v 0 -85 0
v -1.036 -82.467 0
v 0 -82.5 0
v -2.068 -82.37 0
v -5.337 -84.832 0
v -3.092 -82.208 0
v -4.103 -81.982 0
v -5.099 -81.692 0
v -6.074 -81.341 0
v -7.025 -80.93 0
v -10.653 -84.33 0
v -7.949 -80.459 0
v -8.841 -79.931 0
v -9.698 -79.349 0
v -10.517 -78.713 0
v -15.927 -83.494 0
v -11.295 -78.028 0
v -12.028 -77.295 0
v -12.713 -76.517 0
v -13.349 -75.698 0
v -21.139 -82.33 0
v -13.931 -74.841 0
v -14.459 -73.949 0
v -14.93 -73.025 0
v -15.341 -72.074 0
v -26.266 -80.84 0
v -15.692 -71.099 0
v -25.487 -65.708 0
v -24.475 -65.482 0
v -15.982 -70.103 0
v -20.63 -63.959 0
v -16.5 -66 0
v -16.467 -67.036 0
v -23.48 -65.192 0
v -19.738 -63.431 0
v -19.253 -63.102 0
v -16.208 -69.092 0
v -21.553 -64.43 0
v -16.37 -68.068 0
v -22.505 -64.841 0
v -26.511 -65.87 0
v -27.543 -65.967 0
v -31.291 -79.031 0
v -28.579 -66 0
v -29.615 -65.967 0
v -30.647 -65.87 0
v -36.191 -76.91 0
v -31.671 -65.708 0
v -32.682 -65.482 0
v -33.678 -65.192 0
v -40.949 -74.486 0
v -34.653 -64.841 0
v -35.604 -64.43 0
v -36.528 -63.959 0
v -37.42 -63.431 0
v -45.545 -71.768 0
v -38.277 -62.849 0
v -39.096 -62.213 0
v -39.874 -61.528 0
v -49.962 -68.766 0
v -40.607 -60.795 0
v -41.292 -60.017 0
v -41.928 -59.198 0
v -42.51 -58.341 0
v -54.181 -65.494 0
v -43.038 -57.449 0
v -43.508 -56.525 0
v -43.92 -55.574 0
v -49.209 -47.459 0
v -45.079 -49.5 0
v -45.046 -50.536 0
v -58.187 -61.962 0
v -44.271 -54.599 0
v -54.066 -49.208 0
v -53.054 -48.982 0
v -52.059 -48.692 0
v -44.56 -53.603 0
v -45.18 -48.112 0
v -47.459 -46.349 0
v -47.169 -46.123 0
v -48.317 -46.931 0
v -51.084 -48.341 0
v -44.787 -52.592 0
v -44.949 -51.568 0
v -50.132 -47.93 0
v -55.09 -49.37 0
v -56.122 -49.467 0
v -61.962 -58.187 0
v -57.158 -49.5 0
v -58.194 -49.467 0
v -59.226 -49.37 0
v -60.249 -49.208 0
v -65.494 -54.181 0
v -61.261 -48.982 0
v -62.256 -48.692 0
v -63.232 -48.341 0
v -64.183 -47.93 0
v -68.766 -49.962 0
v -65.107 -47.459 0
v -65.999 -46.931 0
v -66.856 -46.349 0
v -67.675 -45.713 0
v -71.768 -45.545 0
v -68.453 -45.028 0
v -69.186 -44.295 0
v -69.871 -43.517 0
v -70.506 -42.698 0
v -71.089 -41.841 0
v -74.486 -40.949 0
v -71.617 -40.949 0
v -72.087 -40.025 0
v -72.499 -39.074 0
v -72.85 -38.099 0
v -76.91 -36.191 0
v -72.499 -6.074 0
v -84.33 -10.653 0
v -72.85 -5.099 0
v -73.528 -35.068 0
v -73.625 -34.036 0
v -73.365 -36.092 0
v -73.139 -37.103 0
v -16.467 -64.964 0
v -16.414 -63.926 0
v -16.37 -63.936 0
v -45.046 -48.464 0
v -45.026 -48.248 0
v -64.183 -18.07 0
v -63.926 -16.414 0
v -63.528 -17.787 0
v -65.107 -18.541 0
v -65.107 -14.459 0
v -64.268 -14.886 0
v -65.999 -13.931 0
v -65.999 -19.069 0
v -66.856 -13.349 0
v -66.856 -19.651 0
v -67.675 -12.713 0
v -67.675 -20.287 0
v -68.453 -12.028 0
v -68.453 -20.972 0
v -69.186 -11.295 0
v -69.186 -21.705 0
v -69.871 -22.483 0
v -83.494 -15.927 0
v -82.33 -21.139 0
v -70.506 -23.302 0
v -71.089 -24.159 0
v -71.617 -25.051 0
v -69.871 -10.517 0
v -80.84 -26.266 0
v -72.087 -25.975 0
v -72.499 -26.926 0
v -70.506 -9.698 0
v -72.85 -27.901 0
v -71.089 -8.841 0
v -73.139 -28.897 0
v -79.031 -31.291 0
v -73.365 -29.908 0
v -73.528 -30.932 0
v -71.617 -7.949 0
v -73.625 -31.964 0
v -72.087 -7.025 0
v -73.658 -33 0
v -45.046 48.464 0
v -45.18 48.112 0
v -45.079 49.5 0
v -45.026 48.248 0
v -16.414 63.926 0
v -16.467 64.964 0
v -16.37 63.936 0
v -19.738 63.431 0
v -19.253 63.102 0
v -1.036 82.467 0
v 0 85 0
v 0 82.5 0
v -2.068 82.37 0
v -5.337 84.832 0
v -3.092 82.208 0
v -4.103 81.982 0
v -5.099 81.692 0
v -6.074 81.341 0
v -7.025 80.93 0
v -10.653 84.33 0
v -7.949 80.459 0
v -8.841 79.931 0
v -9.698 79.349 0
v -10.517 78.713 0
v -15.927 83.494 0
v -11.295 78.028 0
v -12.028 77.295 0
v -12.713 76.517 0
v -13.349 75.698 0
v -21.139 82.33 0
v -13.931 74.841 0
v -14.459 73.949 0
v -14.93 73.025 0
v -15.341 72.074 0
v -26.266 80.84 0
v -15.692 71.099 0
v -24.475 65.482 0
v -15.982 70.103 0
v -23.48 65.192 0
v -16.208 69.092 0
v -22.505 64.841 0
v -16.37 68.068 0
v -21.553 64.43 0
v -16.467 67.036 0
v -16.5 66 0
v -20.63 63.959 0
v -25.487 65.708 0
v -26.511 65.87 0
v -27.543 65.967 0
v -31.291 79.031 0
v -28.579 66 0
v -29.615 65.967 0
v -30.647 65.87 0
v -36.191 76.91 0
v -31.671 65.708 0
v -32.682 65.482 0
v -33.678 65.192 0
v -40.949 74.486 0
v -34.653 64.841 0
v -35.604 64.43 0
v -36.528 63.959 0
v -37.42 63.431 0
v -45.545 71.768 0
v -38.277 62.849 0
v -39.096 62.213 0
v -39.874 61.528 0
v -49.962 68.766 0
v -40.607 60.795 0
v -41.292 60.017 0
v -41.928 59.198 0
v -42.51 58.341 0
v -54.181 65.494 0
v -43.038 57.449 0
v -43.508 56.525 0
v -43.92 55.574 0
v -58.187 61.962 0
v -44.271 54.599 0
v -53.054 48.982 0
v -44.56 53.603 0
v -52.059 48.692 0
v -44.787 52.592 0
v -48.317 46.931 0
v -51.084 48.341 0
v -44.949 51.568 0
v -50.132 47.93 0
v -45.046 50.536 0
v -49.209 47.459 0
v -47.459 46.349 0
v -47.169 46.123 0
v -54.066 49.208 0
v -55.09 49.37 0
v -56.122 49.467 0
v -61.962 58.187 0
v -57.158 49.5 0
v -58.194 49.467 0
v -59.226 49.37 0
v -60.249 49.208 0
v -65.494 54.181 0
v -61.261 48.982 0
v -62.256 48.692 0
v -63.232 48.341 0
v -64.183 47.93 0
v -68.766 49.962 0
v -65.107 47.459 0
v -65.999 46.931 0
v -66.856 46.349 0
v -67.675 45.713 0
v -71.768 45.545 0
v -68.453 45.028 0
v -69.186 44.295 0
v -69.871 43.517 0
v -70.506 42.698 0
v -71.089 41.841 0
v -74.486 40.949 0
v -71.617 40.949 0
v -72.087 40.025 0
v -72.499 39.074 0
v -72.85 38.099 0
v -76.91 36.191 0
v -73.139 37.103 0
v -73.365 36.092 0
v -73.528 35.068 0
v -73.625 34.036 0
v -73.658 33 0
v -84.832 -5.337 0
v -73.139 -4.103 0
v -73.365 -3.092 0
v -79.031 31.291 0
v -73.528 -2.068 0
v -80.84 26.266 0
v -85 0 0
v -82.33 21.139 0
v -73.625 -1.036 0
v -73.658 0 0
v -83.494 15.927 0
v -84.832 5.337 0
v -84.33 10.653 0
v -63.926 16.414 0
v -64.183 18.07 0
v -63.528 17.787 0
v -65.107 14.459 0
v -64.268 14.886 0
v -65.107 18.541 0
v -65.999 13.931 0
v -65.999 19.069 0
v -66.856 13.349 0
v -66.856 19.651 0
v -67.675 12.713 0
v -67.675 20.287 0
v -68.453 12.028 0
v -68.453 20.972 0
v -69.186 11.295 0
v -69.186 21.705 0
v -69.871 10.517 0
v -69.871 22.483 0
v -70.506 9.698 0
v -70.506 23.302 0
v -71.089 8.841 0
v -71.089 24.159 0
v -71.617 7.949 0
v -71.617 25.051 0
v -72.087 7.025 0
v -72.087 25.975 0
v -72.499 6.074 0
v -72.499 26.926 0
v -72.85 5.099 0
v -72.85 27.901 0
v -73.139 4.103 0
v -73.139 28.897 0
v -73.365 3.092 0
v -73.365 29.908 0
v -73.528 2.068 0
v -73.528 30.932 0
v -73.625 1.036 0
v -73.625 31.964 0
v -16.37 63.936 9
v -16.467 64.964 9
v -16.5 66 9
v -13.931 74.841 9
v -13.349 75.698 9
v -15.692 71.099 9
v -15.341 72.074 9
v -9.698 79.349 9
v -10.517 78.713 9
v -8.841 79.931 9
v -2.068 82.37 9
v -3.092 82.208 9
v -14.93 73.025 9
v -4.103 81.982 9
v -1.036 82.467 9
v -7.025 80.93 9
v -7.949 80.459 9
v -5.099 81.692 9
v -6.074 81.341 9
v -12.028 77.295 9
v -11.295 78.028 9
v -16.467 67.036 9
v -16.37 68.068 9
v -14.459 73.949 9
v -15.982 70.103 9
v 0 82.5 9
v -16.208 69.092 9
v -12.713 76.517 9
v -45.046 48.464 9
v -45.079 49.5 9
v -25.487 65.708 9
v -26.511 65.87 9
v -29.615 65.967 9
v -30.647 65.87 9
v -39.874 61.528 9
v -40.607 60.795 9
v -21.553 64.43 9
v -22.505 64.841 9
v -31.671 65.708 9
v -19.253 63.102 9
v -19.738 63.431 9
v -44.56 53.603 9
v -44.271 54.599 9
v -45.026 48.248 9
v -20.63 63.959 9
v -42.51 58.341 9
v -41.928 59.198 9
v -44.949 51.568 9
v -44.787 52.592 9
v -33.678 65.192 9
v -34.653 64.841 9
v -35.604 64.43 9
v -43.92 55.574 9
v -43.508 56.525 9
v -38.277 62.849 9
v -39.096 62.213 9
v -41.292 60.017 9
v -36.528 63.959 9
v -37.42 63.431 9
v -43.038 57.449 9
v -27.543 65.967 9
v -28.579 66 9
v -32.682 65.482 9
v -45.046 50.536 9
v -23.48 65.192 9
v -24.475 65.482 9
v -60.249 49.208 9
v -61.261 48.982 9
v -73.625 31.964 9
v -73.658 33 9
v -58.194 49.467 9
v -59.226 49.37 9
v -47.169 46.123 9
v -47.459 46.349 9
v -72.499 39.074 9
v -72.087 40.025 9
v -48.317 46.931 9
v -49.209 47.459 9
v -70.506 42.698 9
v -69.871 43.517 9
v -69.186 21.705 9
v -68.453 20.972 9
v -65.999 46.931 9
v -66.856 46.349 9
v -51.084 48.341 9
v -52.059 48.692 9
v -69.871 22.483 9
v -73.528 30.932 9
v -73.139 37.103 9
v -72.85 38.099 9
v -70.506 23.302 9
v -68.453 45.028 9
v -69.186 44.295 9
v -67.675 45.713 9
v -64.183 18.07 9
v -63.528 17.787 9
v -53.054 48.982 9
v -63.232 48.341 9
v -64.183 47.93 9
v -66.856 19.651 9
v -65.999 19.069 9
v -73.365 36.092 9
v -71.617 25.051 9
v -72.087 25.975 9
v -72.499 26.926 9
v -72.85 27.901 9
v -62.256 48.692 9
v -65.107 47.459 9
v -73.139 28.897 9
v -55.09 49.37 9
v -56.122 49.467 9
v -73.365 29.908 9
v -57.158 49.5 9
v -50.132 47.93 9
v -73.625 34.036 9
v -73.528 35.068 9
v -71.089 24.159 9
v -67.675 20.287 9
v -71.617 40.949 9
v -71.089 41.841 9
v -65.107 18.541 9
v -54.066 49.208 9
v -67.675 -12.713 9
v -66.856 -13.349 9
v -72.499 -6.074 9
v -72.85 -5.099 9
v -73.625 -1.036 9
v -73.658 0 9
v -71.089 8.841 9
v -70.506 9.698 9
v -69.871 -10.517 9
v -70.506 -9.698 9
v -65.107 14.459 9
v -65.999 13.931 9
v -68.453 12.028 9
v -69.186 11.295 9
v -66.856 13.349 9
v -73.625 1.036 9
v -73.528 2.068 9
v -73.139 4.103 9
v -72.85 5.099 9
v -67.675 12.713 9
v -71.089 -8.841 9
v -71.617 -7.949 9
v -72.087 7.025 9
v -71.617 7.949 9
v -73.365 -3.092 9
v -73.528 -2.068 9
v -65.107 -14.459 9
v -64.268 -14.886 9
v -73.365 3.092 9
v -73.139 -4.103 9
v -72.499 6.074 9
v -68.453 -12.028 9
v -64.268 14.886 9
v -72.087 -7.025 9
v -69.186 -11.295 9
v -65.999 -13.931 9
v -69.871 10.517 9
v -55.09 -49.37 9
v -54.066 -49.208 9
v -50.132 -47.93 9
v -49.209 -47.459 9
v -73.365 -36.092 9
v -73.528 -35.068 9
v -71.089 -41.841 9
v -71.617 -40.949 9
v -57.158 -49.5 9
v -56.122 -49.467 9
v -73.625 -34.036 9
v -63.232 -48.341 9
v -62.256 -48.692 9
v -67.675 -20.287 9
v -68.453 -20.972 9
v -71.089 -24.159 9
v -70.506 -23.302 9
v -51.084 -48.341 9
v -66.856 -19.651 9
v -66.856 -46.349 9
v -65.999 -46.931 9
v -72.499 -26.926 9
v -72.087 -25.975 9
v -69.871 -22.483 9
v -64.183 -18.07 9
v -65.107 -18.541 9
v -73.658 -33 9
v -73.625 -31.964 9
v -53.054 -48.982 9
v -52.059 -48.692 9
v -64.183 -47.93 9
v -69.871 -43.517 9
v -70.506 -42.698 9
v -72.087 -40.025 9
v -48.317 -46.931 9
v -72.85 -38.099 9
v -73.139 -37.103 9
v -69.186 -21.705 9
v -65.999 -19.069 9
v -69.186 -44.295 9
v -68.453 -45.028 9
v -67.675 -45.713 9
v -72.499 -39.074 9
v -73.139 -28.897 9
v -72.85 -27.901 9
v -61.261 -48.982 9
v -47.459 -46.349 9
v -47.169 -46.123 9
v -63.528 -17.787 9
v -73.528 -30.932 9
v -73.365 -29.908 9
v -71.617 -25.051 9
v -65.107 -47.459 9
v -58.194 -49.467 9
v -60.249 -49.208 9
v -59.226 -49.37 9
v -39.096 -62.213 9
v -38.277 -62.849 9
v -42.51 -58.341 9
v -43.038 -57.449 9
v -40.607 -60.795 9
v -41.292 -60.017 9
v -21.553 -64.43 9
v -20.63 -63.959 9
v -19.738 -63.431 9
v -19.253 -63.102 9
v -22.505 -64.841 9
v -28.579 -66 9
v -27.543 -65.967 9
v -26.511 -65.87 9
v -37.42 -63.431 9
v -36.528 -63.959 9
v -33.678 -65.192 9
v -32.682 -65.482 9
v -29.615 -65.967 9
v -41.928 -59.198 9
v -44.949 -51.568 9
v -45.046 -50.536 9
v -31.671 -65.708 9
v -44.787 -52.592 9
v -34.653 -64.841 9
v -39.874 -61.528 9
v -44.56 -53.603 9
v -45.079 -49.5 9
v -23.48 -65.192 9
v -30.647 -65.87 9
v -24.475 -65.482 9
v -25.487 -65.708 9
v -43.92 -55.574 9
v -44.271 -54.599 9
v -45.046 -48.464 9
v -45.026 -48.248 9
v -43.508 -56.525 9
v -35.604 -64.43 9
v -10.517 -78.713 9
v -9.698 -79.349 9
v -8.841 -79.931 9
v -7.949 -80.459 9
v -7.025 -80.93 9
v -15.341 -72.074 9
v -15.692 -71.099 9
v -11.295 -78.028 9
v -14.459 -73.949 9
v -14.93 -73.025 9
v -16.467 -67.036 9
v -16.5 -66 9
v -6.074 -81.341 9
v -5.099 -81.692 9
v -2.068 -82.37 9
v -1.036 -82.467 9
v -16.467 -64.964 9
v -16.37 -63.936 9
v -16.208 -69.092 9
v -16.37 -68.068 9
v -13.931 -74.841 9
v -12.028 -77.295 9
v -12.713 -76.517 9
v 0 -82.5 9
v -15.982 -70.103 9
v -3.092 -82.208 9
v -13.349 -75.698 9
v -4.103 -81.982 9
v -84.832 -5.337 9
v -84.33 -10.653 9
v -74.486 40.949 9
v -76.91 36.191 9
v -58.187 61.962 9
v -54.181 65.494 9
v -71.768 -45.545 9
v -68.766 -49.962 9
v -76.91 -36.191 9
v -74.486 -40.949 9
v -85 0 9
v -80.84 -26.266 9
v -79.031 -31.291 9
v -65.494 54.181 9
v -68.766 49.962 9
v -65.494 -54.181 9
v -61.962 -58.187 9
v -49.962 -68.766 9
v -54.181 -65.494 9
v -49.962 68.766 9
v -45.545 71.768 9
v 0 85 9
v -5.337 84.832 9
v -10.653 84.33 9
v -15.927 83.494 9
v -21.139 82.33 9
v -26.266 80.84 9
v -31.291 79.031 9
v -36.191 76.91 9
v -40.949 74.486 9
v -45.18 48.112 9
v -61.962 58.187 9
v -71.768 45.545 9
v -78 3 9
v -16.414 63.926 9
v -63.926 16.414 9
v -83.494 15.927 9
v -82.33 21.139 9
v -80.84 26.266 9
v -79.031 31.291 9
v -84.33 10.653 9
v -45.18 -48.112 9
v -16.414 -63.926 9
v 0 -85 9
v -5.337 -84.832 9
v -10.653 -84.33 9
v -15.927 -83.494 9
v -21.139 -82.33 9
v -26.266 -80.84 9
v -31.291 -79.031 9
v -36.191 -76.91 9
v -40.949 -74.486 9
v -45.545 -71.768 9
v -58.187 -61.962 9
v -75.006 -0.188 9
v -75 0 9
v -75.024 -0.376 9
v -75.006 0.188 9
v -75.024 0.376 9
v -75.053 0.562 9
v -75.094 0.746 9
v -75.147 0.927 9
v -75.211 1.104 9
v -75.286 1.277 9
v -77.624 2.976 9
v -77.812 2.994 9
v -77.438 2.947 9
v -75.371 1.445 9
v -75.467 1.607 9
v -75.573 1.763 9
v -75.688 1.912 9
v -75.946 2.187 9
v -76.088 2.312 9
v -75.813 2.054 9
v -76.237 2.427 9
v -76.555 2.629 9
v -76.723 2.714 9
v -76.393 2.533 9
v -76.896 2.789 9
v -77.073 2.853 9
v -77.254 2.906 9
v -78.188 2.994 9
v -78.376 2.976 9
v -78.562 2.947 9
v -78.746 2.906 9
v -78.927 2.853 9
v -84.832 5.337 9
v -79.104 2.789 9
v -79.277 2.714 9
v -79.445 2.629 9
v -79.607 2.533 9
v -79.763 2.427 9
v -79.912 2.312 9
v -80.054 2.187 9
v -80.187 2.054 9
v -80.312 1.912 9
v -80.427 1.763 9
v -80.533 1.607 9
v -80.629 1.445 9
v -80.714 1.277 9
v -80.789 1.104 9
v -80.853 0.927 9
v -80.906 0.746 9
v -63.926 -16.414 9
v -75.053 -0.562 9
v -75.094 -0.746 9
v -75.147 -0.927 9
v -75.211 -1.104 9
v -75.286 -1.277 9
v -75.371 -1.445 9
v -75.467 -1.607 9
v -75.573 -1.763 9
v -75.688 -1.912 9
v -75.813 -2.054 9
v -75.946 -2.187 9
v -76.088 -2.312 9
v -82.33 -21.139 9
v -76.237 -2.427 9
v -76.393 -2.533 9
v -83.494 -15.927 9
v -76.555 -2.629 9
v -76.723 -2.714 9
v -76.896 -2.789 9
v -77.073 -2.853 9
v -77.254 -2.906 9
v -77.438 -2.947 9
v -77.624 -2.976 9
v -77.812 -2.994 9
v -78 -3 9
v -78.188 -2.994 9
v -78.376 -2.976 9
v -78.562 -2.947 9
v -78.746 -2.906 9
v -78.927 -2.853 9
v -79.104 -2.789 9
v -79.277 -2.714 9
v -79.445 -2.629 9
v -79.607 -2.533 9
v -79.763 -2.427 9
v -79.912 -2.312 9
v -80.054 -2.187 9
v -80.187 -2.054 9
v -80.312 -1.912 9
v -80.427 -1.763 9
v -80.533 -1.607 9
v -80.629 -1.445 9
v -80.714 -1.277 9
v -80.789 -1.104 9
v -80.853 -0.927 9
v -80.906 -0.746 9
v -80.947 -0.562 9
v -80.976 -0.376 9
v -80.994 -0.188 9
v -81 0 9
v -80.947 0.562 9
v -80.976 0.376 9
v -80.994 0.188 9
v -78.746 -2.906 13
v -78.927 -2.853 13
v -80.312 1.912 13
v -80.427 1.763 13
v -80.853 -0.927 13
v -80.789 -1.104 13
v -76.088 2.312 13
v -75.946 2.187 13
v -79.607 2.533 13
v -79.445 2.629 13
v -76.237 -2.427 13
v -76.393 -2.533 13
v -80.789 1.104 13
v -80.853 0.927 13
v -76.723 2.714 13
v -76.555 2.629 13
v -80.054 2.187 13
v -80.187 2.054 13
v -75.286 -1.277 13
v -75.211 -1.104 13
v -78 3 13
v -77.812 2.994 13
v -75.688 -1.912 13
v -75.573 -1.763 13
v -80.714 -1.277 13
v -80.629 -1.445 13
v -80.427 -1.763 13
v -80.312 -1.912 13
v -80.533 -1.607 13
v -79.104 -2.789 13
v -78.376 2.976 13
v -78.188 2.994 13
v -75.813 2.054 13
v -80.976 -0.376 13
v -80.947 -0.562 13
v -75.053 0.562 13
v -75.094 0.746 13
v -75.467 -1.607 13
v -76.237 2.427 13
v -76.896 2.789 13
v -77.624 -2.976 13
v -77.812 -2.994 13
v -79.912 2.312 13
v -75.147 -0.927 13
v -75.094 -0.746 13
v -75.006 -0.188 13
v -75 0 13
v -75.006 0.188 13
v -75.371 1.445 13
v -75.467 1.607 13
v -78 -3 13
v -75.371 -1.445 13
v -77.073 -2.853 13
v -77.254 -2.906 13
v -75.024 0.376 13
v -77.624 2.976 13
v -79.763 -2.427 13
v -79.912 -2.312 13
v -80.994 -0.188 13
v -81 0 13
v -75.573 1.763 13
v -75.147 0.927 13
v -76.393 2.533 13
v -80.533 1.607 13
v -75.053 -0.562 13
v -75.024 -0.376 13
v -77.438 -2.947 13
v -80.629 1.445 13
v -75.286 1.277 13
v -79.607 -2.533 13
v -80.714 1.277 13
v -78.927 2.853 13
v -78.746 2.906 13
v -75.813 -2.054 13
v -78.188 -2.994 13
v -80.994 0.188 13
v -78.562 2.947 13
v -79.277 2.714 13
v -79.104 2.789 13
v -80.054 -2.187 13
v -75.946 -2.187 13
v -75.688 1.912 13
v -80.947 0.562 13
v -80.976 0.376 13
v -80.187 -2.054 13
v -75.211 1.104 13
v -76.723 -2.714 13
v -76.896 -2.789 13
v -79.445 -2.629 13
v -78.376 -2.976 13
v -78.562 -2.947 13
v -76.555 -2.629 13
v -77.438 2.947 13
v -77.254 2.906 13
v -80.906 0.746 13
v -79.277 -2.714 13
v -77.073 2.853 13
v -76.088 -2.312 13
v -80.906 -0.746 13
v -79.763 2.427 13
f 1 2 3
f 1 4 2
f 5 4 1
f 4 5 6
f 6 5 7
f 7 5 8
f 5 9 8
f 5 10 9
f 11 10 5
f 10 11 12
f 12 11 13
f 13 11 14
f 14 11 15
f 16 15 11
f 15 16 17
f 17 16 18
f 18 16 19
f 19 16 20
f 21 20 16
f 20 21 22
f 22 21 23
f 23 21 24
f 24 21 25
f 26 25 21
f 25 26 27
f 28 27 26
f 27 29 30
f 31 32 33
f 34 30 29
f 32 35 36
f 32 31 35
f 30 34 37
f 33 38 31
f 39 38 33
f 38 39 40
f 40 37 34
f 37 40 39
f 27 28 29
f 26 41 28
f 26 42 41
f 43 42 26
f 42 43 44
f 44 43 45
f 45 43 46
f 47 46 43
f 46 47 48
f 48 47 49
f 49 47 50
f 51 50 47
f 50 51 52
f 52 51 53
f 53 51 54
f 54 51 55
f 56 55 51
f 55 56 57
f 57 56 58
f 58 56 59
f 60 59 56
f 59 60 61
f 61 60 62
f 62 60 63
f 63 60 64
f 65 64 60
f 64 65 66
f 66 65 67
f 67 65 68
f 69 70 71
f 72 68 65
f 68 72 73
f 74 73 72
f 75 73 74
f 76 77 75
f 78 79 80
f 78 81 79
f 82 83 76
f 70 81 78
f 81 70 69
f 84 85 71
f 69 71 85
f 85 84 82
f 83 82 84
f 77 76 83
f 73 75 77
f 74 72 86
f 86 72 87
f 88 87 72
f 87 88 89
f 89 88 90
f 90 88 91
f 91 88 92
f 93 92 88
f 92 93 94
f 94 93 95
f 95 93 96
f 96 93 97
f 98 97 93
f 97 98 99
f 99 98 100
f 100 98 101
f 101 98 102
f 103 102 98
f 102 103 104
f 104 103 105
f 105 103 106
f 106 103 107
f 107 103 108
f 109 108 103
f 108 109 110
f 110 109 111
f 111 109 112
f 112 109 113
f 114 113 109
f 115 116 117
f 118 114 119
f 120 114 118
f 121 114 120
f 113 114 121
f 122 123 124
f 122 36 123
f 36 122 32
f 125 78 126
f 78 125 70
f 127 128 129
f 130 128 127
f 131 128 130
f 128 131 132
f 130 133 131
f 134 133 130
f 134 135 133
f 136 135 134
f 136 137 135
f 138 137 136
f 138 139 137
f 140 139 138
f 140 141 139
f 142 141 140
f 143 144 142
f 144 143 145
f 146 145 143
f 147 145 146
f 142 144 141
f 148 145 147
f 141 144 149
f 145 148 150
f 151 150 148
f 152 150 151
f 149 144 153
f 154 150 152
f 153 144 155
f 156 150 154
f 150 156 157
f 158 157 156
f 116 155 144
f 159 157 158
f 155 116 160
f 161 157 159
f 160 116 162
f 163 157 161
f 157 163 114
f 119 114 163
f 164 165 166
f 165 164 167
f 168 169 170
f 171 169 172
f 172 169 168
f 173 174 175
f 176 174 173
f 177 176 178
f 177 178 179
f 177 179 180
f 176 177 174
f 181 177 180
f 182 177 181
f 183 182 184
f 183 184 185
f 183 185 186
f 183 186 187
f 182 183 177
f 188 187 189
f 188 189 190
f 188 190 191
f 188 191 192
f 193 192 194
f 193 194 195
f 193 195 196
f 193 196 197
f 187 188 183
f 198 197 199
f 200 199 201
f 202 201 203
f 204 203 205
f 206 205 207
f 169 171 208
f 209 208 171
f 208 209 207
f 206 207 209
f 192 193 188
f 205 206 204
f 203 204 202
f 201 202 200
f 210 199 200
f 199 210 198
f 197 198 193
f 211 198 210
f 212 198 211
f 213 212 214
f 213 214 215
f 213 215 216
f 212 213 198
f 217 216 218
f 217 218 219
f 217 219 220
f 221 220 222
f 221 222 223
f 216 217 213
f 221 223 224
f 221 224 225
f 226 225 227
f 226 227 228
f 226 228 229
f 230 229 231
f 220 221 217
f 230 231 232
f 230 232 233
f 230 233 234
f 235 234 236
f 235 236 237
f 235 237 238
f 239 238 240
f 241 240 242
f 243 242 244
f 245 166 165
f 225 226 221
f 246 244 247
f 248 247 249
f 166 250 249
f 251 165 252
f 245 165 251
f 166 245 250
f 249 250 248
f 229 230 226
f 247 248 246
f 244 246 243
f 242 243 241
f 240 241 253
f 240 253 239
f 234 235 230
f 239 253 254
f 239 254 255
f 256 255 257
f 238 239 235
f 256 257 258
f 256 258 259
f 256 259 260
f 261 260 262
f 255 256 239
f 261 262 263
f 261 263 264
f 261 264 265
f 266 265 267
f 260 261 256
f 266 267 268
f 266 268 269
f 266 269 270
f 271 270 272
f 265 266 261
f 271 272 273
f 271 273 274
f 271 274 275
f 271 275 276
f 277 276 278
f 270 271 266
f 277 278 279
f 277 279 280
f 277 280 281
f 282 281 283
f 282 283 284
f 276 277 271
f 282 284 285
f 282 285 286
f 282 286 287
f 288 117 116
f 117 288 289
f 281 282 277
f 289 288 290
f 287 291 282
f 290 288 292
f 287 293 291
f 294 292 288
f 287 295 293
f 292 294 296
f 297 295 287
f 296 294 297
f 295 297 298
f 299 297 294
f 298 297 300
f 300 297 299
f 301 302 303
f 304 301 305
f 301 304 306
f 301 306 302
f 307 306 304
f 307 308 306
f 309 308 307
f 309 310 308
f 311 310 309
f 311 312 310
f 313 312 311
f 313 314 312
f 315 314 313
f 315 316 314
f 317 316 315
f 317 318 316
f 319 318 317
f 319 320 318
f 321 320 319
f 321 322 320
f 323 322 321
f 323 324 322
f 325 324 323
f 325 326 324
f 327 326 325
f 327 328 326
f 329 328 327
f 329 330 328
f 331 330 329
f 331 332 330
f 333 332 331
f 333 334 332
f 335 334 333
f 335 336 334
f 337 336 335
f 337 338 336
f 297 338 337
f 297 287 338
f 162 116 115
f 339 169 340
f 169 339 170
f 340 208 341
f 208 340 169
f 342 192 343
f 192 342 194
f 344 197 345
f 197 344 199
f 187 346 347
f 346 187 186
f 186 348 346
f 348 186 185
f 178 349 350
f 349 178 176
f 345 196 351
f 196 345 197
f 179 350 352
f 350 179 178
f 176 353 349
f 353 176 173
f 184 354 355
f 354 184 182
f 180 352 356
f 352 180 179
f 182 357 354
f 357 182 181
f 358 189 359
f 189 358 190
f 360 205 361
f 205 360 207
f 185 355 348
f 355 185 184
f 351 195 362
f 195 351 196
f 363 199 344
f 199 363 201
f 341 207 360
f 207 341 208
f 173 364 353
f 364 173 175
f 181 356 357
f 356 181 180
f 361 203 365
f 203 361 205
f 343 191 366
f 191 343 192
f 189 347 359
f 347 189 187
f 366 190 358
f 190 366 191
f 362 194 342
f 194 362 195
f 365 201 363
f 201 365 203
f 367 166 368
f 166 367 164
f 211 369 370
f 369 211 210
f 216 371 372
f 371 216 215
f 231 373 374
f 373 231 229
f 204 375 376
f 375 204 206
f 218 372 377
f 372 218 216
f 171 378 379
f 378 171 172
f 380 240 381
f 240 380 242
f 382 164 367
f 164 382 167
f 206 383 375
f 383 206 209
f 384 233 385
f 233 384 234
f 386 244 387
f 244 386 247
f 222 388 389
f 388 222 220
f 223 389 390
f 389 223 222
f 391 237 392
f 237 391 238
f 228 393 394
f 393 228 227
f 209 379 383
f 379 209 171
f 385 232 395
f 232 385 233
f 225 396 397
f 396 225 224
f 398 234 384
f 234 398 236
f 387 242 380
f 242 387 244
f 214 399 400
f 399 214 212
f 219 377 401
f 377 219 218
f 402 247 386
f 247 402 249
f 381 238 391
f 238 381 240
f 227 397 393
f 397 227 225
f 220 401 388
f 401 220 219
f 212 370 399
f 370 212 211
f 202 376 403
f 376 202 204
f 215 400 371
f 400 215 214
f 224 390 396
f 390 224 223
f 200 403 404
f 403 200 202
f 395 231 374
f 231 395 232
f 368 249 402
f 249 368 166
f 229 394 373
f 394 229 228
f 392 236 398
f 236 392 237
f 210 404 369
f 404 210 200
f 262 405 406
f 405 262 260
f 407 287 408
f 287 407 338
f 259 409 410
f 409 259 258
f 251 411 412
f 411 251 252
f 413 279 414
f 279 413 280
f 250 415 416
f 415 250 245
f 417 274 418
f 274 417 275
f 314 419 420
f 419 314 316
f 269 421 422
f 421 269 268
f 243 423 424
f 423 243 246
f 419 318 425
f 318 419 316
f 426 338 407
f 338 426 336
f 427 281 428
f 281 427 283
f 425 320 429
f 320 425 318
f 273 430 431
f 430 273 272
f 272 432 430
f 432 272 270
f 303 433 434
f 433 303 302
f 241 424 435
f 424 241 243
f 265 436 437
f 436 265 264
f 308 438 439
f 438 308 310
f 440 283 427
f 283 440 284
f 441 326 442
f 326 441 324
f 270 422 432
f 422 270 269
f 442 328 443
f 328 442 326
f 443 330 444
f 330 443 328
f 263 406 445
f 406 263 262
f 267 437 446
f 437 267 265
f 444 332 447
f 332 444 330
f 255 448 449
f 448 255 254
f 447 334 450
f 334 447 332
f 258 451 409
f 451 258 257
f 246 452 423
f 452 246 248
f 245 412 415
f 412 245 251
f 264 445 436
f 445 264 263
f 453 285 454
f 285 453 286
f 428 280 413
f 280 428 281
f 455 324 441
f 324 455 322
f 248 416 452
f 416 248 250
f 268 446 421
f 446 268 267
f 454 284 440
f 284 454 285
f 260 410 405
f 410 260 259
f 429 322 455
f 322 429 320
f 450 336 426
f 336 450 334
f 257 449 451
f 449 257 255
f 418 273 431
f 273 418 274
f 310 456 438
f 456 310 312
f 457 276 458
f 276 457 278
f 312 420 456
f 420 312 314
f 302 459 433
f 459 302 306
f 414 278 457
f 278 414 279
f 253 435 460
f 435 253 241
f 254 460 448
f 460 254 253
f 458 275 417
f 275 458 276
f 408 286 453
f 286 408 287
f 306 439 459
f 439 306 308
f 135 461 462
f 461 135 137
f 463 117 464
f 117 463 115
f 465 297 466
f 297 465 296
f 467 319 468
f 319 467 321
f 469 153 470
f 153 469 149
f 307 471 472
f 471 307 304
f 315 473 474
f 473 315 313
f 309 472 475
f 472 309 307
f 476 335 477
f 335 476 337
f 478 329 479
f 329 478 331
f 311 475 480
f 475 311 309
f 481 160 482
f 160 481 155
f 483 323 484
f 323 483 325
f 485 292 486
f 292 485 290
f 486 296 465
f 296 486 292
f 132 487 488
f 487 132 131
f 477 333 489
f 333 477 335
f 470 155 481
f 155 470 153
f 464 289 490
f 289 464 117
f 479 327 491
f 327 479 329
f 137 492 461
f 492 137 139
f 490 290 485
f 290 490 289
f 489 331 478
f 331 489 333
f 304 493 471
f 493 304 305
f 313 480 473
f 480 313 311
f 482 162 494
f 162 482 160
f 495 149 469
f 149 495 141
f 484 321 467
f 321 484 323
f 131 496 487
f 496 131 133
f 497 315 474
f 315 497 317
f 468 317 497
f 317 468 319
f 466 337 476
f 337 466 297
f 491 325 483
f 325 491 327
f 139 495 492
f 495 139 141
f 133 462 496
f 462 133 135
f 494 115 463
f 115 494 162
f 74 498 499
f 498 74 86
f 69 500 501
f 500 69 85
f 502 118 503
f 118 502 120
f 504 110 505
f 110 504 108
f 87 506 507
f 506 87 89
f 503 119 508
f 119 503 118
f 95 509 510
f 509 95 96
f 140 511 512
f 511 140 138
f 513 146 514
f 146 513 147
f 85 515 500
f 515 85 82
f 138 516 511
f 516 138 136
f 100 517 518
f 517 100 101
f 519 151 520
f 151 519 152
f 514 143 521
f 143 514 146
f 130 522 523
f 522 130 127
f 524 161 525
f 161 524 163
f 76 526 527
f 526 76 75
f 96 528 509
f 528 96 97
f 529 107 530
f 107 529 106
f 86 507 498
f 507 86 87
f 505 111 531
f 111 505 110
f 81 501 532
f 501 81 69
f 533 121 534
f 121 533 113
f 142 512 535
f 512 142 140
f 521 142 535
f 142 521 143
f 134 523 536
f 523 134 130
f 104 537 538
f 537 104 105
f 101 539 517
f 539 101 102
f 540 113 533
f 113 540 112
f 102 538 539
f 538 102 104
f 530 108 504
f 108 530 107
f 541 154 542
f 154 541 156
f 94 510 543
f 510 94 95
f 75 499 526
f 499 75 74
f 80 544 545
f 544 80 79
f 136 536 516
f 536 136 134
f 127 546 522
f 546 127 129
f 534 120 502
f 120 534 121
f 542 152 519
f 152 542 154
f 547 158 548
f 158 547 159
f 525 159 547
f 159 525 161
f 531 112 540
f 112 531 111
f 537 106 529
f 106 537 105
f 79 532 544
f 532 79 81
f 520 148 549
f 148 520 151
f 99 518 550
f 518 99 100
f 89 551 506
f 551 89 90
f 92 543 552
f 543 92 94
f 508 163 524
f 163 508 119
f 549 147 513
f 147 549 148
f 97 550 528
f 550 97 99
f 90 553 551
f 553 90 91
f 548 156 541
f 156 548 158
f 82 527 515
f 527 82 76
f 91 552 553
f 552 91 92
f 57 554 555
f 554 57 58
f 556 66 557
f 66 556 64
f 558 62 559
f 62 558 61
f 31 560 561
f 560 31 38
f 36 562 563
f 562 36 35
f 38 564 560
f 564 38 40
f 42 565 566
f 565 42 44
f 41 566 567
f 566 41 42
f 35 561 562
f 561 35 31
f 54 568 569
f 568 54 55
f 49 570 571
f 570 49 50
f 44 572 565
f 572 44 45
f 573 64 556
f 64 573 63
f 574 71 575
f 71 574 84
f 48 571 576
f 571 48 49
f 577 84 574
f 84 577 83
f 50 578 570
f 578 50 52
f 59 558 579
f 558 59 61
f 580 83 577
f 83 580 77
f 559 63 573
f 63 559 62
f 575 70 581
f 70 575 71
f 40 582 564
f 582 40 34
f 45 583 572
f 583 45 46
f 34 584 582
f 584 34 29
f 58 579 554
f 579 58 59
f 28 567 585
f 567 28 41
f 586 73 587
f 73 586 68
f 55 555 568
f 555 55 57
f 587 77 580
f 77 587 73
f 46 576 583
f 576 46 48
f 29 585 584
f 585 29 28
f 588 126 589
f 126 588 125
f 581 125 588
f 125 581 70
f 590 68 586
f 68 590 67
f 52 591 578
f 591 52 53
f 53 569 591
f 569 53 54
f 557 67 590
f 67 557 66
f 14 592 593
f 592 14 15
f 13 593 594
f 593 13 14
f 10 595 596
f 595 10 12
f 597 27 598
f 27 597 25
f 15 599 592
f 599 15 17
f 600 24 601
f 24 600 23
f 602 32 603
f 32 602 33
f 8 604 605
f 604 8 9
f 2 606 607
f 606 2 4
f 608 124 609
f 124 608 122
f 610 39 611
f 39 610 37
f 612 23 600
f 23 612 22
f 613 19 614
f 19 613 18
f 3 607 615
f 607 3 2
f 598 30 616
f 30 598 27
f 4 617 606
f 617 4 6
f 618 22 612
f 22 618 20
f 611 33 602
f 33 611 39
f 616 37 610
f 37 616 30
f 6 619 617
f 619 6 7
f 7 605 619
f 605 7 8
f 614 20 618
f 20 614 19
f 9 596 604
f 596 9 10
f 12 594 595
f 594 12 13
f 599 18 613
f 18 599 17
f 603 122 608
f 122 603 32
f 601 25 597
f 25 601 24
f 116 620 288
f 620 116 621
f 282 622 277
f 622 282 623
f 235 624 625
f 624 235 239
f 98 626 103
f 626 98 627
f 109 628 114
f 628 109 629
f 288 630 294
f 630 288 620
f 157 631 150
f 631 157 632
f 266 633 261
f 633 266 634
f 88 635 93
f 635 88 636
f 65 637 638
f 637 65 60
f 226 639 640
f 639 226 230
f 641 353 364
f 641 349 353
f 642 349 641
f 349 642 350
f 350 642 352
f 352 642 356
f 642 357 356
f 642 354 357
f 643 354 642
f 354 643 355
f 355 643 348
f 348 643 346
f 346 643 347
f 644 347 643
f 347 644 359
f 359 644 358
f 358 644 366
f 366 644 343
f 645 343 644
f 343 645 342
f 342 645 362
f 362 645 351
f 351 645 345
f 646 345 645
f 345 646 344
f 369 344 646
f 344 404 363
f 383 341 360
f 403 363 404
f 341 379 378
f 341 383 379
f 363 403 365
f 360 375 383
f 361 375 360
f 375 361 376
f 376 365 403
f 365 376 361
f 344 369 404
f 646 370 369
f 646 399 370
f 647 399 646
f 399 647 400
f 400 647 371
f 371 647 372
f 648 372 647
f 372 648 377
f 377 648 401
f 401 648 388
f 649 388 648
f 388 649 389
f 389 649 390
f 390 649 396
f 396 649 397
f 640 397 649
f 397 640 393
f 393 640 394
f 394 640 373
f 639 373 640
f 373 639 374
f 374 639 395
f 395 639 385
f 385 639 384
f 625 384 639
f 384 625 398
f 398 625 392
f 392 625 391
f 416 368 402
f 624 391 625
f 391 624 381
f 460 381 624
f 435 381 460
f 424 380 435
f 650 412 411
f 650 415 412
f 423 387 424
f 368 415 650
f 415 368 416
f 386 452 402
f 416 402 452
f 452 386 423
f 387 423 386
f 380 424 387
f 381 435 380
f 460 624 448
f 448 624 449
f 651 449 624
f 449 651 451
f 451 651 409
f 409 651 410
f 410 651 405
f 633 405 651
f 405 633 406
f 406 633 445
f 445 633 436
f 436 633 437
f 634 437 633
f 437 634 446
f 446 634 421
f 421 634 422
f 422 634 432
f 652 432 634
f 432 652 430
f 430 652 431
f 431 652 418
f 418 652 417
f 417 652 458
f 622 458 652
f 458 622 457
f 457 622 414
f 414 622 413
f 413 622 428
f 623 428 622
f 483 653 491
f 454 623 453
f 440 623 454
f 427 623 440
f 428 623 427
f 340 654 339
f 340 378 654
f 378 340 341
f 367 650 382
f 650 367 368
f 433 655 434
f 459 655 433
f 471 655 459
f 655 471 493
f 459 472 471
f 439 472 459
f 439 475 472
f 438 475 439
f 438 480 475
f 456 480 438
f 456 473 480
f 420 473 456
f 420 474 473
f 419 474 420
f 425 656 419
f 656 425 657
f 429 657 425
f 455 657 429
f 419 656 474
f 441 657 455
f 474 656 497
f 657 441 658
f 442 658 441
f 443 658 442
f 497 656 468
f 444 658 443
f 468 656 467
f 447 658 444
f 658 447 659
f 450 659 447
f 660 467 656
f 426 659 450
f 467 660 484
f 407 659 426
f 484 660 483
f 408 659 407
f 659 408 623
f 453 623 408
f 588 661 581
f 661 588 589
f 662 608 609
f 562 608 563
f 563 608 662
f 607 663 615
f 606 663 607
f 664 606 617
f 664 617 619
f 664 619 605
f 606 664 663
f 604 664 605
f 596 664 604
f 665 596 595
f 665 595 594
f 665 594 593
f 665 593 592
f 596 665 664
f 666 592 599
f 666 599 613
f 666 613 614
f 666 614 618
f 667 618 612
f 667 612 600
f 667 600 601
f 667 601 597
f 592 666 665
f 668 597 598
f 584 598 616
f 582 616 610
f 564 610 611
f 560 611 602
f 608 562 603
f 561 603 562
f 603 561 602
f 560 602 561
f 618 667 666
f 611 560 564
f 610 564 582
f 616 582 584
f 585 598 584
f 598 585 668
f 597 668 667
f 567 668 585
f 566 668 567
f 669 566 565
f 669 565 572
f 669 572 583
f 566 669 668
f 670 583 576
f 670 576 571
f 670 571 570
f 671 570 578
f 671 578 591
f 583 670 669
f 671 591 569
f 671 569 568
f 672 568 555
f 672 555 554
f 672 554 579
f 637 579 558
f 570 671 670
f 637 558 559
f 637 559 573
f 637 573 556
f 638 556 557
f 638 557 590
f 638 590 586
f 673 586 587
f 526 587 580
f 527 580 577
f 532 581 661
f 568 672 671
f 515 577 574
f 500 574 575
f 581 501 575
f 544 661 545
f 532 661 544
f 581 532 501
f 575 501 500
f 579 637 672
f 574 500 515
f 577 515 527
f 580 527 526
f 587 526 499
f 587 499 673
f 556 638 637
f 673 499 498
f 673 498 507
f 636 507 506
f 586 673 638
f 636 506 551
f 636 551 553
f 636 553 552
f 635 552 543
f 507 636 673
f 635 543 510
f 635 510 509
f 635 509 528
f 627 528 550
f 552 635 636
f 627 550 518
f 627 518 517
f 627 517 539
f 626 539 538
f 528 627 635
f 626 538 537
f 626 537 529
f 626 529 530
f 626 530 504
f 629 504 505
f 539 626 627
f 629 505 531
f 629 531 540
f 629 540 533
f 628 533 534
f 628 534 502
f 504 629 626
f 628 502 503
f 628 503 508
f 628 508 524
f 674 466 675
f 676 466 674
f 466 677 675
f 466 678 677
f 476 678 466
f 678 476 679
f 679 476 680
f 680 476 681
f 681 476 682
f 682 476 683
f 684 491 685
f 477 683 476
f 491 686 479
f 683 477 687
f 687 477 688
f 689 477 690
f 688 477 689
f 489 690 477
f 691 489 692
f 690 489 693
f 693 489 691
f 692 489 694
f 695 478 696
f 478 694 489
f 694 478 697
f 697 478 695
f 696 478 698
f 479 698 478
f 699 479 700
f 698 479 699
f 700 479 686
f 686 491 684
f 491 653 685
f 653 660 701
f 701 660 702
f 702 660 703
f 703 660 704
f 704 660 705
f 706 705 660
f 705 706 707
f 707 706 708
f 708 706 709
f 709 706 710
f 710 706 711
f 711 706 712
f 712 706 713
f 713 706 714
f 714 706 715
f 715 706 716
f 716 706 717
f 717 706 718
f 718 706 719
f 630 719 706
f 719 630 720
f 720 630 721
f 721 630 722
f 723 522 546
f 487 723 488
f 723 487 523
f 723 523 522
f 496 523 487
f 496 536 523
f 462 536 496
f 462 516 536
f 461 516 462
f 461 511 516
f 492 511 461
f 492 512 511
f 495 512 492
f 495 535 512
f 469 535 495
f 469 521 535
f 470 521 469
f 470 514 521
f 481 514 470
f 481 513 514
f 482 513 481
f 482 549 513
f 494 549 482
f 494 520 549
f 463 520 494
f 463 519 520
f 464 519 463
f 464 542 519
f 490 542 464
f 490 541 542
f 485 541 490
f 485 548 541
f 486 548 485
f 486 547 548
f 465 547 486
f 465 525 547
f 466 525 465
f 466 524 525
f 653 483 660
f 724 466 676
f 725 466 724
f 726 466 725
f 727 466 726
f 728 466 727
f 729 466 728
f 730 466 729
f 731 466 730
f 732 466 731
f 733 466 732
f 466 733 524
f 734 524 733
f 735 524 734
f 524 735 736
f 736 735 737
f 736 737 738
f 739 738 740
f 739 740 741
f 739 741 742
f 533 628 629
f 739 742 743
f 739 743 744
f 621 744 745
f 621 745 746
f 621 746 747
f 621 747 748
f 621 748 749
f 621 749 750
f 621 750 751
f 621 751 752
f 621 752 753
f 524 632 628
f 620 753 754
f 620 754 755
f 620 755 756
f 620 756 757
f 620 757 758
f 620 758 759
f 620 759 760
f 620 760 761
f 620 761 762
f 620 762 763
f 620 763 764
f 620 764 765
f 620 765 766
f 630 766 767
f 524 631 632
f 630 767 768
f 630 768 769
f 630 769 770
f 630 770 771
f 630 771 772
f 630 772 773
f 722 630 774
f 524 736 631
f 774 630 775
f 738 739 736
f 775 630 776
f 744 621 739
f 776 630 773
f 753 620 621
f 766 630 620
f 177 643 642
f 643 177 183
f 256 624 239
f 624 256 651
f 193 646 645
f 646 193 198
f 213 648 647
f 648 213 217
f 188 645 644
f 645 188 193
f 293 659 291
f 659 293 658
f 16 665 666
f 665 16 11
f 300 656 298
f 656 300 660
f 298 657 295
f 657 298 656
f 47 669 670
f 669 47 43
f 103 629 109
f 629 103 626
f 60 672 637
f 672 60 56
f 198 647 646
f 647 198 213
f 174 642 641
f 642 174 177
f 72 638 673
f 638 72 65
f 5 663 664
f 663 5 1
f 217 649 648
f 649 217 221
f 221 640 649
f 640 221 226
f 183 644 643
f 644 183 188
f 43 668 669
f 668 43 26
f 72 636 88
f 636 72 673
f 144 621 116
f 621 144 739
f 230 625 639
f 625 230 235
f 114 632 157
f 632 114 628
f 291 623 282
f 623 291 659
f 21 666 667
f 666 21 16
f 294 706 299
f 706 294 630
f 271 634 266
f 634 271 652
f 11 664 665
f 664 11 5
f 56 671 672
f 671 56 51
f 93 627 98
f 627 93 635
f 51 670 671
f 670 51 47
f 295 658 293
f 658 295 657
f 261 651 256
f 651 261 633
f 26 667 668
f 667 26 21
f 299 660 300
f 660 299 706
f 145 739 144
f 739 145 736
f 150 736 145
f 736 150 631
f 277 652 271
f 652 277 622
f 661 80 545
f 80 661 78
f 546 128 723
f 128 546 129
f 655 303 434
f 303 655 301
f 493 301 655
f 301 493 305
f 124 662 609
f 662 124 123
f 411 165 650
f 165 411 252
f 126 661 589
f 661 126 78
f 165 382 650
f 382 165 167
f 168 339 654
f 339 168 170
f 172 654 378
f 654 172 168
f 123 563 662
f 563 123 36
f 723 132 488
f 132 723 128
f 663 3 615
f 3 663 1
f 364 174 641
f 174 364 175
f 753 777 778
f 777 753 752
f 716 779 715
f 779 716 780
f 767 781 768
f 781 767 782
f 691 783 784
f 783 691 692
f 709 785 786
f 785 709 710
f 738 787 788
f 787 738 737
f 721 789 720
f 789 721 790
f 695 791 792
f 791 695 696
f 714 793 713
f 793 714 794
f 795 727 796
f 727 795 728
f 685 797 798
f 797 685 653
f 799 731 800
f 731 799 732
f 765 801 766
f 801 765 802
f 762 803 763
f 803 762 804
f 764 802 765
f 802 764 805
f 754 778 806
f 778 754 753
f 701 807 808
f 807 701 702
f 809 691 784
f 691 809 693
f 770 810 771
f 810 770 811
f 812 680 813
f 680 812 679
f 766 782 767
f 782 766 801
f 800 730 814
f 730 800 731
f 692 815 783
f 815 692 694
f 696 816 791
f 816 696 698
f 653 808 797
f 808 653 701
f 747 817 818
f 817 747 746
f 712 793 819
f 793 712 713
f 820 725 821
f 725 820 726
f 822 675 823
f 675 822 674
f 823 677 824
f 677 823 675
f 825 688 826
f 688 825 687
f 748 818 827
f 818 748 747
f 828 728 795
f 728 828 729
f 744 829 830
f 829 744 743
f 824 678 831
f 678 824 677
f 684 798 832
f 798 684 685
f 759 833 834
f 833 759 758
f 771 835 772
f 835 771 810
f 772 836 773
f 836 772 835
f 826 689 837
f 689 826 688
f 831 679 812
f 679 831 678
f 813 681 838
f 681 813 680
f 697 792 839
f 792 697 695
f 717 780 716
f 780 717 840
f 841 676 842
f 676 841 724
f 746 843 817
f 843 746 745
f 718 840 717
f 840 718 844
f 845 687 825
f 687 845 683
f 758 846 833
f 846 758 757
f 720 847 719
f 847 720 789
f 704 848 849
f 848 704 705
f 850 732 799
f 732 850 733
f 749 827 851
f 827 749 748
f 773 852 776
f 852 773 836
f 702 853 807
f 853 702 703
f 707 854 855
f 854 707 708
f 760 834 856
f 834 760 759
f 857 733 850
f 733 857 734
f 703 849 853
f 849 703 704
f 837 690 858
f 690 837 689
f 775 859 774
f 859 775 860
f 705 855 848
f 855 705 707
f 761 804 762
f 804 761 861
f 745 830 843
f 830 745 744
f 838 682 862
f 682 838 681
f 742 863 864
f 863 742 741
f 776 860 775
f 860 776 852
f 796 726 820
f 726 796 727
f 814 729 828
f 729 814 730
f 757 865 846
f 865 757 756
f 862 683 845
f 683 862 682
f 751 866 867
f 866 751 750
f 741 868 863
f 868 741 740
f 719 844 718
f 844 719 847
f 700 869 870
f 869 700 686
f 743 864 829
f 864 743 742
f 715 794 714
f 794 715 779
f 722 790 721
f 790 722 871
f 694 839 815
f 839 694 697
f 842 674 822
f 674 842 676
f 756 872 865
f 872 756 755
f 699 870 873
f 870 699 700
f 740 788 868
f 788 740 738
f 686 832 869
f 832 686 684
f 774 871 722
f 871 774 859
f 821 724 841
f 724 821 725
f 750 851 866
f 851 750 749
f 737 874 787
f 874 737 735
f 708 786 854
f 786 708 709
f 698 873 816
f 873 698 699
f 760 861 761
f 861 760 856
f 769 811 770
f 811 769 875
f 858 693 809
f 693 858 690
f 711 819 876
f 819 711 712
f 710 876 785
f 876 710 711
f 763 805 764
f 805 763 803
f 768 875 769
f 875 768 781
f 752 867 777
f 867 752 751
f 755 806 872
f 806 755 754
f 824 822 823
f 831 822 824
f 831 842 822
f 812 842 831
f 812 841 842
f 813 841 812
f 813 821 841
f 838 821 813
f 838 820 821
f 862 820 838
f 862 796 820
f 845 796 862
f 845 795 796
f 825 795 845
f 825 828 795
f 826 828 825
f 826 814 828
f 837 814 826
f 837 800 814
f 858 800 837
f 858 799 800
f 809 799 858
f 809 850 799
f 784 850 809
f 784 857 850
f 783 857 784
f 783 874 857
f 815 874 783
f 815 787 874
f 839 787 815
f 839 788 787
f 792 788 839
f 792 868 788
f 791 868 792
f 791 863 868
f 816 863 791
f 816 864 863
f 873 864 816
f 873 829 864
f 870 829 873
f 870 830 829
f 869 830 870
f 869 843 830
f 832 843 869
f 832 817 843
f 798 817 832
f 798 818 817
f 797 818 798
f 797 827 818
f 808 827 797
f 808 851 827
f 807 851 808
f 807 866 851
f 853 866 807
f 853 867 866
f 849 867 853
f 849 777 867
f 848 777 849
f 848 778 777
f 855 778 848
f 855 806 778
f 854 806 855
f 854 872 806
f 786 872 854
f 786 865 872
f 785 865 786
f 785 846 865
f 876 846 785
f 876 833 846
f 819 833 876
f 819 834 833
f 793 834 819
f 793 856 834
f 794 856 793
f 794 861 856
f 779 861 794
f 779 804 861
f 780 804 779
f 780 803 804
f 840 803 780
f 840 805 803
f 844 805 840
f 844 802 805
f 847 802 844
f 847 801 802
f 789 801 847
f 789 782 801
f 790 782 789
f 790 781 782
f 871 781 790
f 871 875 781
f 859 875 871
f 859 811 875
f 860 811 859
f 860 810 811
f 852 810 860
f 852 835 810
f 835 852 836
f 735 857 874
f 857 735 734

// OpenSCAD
$fn=100;
difference()
{
    // Major portion of the solid
    cylinder(r=85,h=9);

    r=16.5;
    h=10;
    for (a = [0:6])
    {
        ang=a*60;
        l=3.4641*r;
        // Pcoords: (2*sart(3)*r, 30)
        translate([l*cos(ang),l*sin(ang),0]) cylinder(r=r, h=h);
        nang=ang+30;
        nl=4*r;
        // Pcoords: (4*r, 60)
        translate([nl*cos(nang),nl*sin(nang),0]) cylinder(r=r, h=h);
    }
    // Get rid of all the insides
    cylinder(r=4*16.5,h=10);
    translate([0,-200,0]) cube([200,400,20]);
}
translate([-78,0,8]) cylinder(r=3,h=5);
